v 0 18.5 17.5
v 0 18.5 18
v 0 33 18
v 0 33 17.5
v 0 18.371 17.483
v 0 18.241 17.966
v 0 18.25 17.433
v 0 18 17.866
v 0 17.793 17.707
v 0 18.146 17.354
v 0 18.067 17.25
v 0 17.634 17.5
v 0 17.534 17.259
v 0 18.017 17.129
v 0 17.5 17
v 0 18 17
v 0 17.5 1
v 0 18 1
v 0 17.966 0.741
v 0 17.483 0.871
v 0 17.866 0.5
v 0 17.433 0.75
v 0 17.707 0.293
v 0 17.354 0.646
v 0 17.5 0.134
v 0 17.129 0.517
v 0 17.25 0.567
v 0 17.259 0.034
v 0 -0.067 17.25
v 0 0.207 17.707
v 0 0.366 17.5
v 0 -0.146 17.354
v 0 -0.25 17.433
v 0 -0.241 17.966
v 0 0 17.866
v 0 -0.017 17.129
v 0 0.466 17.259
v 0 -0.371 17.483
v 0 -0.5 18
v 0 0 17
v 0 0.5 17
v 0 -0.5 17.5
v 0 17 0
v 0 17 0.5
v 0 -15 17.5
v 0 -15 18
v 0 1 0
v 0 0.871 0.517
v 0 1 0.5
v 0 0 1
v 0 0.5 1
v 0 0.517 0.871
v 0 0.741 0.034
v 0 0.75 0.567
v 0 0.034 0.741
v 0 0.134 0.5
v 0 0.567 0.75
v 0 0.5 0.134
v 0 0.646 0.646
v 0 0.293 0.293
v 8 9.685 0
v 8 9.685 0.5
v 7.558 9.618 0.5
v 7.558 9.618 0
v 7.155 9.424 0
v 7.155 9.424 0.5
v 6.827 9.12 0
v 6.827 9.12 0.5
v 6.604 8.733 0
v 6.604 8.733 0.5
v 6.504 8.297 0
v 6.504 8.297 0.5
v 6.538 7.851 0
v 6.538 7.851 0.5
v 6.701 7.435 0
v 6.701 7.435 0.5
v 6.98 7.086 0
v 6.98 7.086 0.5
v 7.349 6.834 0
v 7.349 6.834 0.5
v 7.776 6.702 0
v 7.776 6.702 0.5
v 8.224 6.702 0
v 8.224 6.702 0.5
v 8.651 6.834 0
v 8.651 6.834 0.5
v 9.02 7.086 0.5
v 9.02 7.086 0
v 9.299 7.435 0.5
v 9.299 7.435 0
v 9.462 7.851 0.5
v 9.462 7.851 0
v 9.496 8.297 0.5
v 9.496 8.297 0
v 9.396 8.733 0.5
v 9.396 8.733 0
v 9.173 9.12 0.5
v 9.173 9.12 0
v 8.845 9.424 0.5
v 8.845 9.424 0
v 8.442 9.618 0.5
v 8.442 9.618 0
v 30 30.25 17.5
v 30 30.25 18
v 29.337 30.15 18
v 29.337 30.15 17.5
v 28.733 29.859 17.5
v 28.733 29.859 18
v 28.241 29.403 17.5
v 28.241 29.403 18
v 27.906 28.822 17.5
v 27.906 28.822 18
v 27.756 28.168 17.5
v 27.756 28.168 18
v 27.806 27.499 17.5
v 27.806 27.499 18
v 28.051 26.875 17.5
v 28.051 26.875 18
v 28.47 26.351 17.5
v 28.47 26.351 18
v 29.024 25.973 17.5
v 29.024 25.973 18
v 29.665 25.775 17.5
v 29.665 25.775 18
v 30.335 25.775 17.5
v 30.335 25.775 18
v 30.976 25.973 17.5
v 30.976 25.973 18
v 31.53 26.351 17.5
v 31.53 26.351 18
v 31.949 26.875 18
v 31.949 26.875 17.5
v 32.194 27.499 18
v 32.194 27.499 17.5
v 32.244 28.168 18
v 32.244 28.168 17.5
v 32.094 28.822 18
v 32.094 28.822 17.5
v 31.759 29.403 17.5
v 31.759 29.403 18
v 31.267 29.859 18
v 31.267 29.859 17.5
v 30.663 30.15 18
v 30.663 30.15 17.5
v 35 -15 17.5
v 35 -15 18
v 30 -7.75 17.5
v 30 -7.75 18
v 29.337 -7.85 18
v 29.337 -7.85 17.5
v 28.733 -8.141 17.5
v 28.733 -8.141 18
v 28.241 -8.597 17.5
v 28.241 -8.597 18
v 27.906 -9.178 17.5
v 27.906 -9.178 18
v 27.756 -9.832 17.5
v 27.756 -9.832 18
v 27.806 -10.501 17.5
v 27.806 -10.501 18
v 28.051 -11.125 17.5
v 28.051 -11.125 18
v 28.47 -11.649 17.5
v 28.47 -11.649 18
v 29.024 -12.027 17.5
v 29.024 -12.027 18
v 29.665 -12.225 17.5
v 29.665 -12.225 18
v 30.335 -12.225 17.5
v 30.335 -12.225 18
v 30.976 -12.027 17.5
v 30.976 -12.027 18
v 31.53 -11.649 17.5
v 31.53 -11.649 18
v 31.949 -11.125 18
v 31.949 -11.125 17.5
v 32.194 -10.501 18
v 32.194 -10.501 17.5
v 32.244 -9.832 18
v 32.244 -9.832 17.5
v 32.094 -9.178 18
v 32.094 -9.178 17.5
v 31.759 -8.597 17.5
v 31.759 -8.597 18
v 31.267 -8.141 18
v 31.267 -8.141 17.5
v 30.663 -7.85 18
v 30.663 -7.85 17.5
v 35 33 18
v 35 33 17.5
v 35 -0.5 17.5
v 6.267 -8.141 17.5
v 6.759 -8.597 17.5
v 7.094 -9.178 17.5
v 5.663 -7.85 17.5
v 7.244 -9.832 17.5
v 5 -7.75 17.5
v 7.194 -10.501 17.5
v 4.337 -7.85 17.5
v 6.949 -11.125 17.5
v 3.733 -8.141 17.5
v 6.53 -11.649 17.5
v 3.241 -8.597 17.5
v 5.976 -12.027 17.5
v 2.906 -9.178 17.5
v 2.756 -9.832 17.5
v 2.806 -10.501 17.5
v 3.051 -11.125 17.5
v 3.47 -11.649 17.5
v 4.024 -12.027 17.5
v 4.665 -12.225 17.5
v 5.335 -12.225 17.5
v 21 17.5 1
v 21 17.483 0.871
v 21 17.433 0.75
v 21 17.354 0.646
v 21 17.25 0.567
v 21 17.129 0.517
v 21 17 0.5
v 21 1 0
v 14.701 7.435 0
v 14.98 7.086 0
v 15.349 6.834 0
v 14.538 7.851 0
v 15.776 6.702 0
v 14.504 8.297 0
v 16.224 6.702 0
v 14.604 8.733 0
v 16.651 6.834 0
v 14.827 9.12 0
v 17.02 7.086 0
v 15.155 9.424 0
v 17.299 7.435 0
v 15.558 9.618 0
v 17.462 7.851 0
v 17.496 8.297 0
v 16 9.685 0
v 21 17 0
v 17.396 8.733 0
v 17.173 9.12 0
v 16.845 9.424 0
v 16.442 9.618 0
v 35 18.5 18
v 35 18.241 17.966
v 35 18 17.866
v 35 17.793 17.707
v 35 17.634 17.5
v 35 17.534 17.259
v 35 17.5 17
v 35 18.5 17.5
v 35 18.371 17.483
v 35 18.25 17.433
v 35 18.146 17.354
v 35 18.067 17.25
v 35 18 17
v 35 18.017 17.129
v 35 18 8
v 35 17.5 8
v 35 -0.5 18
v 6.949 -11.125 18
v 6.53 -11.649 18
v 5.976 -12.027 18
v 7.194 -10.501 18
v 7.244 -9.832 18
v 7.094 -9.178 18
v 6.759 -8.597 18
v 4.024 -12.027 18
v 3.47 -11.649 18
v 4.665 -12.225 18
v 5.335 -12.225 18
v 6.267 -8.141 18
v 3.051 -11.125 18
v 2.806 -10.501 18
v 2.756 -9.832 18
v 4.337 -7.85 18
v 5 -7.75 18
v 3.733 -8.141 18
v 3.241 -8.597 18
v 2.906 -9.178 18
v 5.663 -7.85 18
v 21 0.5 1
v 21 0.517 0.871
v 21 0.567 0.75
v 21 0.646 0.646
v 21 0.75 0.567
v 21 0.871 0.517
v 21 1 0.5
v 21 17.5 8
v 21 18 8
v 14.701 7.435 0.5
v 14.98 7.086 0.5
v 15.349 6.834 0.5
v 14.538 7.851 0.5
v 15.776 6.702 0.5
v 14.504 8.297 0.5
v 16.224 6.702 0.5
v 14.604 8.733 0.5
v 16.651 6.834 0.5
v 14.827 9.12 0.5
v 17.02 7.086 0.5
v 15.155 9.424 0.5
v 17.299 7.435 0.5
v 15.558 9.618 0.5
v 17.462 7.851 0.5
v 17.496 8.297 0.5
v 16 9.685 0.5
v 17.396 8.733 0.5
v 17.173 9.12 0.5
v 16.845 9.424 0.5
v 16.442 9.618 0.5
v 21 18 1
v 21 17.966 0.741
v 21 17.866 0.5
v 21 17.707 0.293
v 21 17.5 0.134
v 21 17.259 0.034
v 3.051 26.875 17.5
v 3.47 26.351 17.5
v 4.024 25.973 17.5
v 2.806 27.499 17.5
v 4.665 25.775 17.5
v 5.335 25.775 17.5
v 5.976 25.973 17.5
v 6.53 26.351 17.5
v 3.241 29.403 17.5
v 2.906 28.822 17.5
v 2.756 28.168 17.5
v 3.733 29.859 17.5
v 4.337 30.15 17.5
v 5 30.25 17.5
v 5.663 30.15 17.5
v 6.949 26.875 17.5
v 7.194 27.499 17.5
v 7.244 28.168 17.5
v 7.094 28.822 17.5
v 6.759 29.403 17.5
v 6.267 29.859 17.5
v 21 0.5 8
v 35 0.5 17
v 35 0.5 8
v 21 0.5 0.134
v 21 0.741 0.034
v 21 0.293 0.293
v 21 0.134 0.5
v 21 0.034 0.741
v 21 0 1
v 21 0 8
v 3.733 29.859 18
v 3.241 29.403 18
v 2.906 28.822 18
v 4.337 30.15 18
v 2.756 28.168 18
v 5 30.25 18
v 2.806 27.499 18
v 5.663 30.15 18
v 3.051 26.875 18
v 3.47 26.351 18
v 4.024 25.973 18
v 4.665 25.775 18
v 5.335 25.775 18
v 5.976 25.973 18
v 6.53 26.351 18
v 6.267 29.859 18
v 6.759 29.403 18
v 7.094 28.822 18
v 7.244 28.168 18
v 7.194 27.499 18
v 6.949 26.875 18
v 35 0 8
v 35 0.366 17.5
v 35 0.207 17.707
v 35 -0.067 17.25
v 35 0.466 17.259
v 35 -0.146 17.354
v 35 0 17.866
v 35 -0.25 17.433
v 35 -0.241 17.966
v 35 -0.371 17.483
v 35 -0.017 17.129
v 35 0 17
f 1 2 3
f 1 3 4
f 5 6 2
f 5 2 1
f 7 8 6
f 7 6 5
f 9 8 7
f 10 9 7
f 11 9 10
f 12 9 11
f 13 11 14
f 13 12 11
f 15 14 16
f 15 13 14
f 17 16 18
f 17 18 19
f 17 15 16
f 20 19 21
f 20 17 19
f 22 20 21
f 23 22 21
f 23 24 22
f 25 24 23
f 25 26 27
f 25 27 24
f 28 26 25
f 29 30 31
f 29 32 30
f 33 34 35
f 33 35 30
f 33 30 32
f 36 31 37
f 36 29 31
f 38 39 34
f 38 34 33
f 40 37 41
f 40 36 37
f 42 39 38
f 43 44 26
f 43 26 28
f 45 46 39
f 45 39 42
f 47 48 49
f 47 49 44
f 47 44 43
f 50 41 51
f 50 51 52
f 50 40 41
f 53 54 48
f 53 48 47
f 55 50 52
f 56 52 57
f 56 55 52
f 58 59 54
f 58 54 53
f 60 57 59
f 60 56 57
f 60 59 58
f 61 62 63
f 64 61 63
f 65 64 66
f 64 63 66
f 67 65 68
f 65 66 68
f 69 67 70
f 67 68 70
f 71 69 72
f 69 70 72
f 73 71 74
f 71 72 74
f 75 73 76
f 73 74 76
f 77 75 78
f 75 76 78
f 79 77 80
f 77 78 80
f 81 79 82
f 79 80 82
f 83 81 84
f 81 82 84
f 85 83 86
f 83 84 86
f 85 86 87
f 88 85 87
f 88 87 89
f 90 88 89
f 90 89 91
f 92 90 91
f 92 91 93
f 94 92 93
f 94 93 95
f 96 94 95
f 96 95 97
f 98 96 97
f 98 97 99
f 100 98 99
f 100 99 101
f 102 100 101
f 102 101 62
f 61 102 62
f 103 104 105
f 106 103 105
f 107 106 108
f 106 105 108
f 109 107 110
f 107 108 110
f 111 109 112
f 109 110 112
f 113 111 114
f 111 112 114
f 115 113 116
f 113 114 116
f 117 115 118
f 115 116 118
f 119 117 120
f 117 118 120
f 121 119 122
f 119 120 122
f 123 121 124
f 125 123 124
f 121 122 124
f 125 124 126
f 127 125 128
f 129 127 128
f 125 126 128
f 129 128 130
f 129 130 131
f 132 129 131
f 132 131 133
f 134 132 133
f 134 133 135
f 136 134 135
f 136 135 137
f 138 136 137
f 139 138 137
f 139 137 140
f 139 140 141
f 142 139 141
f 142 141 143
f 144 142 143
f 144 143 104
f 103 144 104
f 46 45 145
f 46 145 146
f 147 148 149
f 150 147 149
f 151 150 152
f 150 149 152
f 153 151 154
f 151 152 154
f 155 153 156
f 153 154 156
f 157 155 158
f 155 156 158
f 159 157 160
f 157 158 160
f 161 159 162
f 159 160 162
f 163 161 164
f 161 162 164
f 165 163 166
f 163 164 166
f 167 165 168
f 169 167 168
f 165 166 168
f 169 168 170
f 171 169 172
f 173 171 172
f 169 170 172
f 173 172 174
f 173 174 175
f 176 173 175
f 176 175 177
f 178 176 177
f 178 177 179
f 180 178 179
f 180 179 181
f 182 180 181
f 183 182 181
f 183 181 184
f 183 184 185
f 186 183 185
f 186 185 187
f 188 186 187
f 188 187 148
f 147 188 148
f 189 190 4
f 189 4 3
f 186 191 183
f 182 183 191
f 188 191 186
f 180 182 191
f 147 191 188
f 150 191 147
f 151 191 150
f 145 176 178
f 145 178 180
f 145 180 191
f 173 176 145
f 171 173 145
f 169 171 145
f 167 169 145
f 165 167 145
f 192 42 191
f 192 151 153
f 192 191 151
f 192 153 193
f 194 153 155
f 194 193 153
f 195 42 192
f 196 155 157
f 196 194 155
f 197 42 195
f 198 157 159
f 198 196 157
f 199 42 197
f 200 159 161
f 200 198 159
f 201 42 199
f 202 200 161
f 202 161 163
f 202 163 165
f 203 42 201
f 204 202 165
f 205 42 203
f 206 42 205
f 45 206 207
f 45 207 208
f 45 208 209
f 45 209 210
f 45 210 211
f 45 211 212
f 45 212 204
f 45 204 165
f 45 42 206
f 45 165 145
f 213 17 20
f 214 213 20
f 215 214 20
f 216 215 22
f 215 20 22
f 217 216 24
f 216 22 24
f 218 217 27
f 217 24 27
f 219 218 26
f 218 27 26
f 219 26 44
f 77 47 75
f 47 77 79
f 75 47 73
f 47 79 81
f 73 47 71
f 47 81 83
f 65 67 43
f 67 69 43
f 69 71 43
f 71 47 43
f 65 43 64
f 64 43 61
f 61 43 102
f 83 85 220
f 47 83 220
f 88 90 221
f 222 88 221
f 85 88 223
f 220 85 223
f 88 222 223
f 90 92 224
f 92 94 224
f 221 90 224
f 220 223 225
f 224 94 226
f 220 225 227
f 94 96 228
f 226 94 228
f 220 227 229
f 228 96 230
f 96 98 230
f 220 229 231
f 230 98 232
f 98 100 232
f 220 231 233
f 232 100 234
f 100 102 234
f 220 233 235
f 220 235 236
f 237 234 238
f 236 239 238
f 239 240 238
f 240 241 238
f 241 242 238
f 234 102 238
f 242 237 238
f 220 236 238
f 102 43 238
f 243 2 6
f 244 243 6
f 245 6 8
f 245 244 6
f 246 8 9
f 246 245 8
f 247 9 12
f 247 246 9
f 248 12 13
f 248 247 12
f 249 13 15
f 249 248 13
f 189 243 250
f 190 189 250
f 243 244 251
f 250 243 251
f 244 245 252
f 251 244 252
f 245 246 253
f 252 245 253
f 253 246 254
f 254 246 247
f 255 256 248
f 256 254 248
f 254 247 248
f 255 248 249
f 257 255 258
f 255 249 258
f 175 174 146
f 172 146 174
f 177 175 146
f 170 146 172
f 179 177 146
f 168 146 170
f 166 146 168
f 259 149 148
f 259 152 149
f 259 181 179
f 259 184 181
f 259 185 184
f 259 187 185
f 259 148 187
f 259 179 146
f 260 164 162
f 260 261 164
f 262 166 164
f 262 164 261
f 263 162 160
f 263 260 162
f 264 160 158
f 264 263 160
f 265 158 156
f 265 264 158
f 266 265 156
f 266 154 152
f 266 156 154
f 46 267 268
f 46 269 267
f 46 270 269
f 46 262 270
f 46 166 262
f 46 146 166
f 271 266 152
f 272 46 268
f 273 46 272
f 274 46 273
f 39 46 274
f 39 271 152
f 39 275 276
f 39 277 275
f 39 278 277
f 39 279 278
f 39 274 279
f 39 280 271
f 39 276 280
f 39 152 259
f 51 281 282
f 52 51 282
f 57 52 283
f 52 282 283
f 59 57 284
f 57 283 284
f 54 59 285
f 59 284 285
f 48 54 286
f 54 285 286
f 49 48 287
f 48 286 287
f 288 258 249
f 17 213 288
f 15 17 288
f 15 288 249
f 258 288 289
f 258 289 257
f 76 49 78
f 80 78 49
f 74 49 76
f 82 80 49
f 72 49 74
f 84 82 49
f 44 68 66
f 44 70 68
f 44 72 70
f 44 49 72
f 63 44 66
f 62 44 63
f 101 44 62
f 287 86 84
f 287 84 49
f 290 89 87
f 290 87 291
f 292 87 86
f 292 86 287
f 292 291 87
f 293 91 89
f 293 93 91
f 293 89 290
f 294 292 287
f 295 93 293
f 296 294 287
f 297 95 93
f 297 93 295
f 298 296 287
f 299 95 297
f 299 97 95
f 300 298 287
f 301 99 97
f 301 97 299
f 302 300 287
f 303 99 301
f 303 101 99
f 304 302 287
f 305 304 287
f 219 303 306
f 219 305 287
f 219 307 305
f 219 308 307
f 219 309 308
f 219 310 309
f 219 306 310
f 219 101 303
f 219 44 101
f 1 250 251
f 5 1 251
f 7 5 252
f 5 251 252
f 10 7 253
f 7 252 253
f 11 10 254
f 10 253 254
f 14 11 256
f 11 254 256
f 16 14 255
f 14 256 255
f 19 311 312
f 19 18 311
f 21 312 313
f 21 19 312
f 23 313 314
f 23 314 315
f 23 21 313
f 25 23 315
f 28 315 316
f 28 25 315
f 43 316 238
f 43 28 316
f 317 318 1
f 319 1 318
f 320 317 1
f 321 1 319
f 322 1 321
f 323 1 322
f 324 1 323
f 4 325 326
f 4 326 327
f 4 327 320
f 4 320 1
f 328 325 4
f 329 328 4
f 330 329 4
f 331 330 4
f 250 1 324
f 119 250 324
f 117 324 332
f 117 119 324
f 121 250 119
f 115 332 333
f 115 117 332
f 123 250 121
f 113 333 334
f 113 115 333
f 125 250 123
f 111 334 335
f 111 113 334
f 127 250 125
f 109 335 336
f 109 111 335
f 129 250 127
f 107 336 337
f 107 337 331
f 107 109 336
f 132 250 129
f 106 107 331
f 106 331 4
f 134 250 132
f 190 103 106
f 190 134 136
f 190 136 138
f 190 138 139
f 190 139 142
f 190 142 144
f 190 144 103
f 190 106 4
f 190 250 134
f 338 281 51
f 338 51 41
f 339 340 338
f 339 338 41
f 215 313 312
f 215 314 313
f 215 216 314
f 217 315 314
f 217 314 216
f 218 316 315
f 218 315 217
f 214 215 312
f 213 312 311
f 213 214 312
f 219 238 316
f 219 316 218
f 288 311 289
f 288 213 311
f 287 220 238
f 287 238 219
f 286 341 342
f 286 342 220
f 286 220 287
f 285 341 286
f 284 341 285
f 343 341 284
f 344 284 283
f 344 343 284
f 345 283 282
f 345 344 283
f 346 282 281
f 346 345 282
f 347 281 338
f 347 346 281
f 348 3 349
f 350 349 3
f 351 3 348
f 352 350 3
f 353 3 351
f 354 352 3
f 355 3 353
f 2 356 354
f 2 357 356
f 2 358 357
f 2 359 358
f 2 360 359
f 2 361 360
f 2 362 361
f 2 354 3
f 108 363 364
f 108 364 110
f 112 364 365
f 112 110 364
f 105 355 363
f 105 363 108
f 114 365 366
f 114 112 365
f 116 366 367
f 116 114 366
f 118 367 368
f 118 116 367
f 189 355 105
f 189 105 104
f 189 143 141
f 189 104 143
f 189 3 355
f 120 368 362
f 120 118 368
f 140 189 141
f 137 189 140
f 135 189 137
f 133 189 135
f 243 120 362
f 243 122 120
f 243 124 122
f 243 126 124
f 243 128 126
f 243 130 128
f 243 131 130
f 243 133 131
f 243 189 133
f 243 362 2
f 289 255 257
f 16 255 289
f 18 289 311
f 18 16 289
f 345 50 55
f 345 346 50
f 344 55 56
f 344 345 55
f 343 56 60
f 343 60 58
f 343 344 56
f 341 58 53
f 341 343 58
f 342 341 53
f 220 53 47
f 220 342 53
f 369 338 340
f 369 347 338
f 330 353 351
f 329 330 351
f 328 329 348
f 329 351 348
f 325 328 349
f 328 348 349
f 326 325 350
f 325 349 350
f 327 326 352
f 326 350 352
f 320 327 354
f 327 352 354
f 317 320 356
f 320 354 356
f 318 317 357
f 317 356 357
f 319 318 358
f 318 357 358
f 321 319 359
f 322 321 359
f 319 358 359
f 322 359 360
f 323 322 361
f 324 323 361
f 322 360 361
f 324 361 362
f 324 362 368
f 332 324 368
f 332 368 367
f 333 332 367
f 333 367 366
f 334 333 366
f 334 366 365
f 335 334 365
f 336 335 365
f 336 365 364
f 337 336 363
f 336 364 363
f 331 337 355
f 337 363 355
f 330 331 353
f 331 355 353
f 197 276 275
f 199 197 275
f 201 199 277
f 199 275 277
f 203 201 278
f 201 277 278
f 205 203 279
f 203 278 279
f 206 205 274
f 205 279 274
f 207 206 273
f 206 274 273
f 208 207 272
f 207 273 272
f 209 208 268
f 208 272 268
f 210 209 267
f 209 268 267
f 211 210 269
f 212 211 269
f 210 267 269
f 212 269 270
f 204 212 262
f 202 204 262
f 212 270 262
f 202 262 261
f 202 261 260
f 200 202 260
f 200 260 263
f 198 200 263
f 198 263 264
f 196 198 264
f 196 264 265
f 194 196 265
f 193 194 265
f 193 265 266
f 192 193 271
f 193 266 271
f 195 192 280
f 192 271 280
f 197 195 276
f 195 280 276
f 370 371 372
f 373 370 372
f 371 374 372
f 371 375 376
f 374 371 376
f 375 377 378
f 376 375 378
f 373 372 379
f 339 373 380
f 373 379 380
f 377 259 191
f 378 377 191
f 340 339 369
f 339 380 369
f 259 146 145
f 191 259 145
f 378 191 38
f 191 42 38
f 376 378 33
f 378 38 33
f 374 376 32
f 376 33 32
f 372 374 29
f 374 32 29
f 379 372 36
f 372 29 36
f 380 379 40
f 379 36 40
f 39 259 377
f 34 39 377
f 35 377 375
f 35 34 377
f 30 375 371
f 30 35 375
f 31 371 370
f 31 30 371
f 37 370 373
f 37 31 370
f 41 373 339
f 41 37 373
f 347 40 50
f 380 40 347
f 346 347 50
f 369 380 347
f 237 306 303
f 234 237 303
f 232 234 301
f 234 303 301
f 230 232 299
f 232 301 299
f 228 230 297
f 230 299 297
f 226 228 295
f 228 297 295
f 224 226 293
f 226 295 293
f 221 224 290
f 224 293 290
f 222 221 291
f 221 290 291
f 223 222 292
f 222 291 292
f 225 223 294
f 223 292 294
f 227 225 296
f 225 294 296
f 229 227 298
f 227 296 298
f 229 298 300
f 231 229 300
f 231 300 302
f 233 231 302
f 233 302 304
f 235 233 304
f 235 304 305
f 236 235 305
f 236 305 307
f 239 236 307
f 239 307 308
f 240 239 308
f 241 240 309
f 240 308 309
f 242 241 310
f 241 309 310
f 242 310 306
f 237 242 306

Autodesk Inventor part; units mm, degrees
ref_plane "YZ Plane" through (0, 0, 0) normal (1, 0, 0) x (0, 1, 0)
ref_plane "XZ Plane" through (0, 0, 0) normal (0, 1, 0) x (-1, 0, 0)
ref_plane "XY Plane" through (0, 0, 0) normal (0, 0, 1) x (1, 0, 0)
sketch "Skizze2" plane through (0, 0, 0) normal (0, 0, 1) x (1, 0, 0)
  line L0 (0, 18) -> (35, 18)
  line L1 (35, 18) -> (35, 0)
  line L2 (35, 0) -> (0, 0)
  line L3 (0, 0) -> (0, 18)
  dimension "d12" = 18
  dimension "d13" = 35
extrude "Grobblech2" add sketch "Skizze2" along normal blind 0.5
sketch "Skizze3" plane through (0, 17.5, 0) normal (0, 1, 0) x (-1, 0, 0)
  line L0 (-35, 0) -> (0, 0)
  line L1 (0, 0) -> (0, 18)
  line L2 (0, 18) -> (-35, 18)
  line L3 (-35, 18) -> (-35, 0)
edge flange "Lasche1" height 18 angle 90 thickness 0.5 bend radius 0.5 thickness toward (0, 1, 0) relief tear relief width 0.5 relief depth 0.25 edges at (17.5, 18, 0.5) wall of the first edge with corners at (35, 17.5, 0) (0, 17.5, 0) (0, 17.5, 18) (35, 17.5, 18)
bend "Biegung1"
corner "Ecke1"
sketch "Skizze4" plane through (35, 0.5, 0) normal (0, -1, 0) x (1, 0, 0)
  line L0 (-35, 0) -> (0, 0)
  line L1 (0, 0) -> (0, 18)
  line L2 (0, 18) -> (-35, 18)
  line L3 (-35, 18) -> (-35, 0)
edge flange "Lasche2" height 18 angle 90 thickness 0.5 bend radius 0.5 thickness toward (0, -1, 0) relief tear relief width 0.5 relief depth 0.25 edges at (17.5, 0, 0.5) wall of the first edge with corners at (0, 0.5, 0) (35, 0.5, 0) (35, 0.5, 18) (0, 0.5, 18)
bend "Biegung2"
corner "Ecke2"
sketch "Skizze5" plane through (35, 17.5, 17.5) normal (0, 0, 1) x (1, 0, 0)
  line L0 (-35, 0) -> (0, 0)
  line L1 (0, 0) -> (0, 15.5)
  line L2 (0, 15.5) -> (-35, 15.5)
  line L3 (-35, 15.5) -> (-35, 0)
edge flange "Lasche3" height 15.5 angle 90 thickness 0.5 bend radius 0.5 thickness toward (0, 0, 1) relief tear relief width 0.5 relief depth 0.25 edges at (17.5, 18, 18) wall of the first edge with corners at (0, 17.5, 17.5) (35, 17.5, 17.5) (35, 33, 17.5) (0, 33, 17.5)
bend "Biegung3"
corner "Ecke3"
sketch "Skizze6" plane through (0, 0.5, 17.5) normal (0, 0, 1) x (1, 0, 0)
  line L0 (35, 0) -> (0, 0)
  line L1 (0, 0) -> (0, -15.5)
  line L2 (0, -15.5) -> (35, -15.5)
  line L3 (35, -15.5) -> (35, 0)
edge flange "Lasche4" height 15.5 angle 90 thickness 0.5 bend radius 0.5 thickness toward (0, 0, 1) relief tear relief width 0.5 relief depth 0.25 edges at (17.5, 0, 18) wall of the first edge with corners at (35, 0.5, 17.5) (0, 0.5, 17.5) (0, -15, 17.5) (35, -15, 17.5)
bend "Biegung4"
corner "Ecke4"
sketch "Skizze7" plane through (0, 0, 1) normal (0, -1, 0) x (1, 0, 0)
  line L0 (35, -1) -> (21, -1)
  line L1 (21, -1) -> (21, 7)
  line L2 (21, 7) -> (35, 7)
  line L3 (35, 7) -> (35, -1)
  line L4 (35, -1) -> (0, -1) projected
  dimension "d55" = 8
  dimension "d56" = 14
extrude "Ausschneiden1" cut sketch "Skizze7" against normal up to surface (18 mm away)
sketch "Skizze8" plane through (0, 0, 0) normal (0, 0, -1) x (-1, 0, 0)
  line L0 (-21, 17) -> (-21, 1) projected
  line L1 (-21, 1) -> (0, 1) projected
  line L2 (0, 17) -> (0, 1) projected
  line L3 (0, 17) -> (-21, 17) projected
  line L4 (0, 9) -> (-30.5159, 9) construction
  line L5 (-35, -15) -> (0, -15) projected
  line L6 (-17.5, -15) -> (-17.5, 33) construction
  line L7 (0, 33) -> (-35, 33) projected
  point P0 (0, 0)
  point P1 (-30, 28)
  point P2 (-5, 28)
  point P3 (-30, -10)
  point P4 (-5, -10)
  dimension "d59" = 25
  dimension "d60" = 38
  dimension "d61" = 25
  dimension "d62" = 38
hole "Bohrung1" at (30, 28, 0) at (5, 28, 0) at (30, -10, 0) at (5, -10, 0) direction (0, 0, 1) diameter 4.5 depth 18
sketch "Skizze9" plane through (0, 0, 0) normal (0, 0, -1) x (-1, 0, 0)
  line L0 (0, 17) -> (0, 1) projected
  point P0 (0, 0)
  point P1 (-8, 8.1851)
  point P2 (-16, 8.1851)
  dimension "d70" = 8
  dimension "d71" = 8
hole "Bohrung2" at (8, 8.1851, 0) at (16, 8.1851, 0) direction (0, 0, 1) diameter 3 end through all
equation "\"d57\" = Stärke"
equation "\"d68\" = Stärke"
equation "\"d14\" = Stärke"
equation "\"d15\" = BreiteBiegungsfreistellung"
equation "\"d16\" = TiefeBiegungsfreistellung"
equation "\"d17\" = MinimalRest"
equation "\"d18\" = Übergangsradius"
equation "\"d21\" = Biegeradius"
equation "\"d22\" = GrößeEckenfreistellung"
equation "\"d23\" = Abstandsgröße"
equation "\"d24\" = JacobiRadiusGröße"
equation "\"d25\" = BreiteBiegungsfreistellung"
equation "\"d26\" = TiefeBiegungsfreistellung"
equation "\"d27\" = MinimalRest"
equation "\"d28\" = Übergangsradius"
equation "\"d31\" = Biegeradius"
equation "\"d32\" = GrößeEckenfreistellung"
equation "\"d33\" = Abstandsgröße"
equation "\"d34\" = JacobiRadiusGröße"
equation "\"d35\" = BreiteBiegungsfreistellung"
equation "\"d36\" = TiefeBiegungsfreistellung"
equation "\"d37\" = MinimalRest"
equation "\"d38\" = Übergangsradius"
equation "\"d41\" = Biegeradius"
equation "\"d42\" = GrößeEckenfreistellung"
equation "\"d43\" = Abstandsgröße"
equation "\"d44\" = JacobiRadiusGröße"
equation "\"d45\" = BreiteBiegungsfreistellung"
equation "\"d46\" = TiefeBiegungsfreistellung"
equation "\"d47\" = MinimalRest"
equation "\"d48\" = Übergangsradius"
equation "\"d51\" = Biegeradius"
equation "\"d52\" = GrößeEckenfreistellung"
equation "\"d53\" = Abstandsgröße"
equation "\"d54\" = JacobiRadiusGröße"
equation "\"Biegeradius\" = Stärke"
equation "\"BreiteBiegungsfreistellung\" = Stärke"
equation "\"TiefeBiegungsfreistellung\" = 0.5 * Stärke"
equation "\"GrößeEckenfreistellung\" = 4 * Stärke"
equation "\"MinimalRest\" = 2 * Stärke"
equation "\"Übergangsradius\" = Biegeradius"
equation "\"JacobiRadiusGröße\" = Biegeradius"
equation "\"Abstandsgröße\" = Stärke"
equation "\"Stärke\" = 0.5"
properties part number "Bügelbefestigung" material "Stahl, galvanisiert"
